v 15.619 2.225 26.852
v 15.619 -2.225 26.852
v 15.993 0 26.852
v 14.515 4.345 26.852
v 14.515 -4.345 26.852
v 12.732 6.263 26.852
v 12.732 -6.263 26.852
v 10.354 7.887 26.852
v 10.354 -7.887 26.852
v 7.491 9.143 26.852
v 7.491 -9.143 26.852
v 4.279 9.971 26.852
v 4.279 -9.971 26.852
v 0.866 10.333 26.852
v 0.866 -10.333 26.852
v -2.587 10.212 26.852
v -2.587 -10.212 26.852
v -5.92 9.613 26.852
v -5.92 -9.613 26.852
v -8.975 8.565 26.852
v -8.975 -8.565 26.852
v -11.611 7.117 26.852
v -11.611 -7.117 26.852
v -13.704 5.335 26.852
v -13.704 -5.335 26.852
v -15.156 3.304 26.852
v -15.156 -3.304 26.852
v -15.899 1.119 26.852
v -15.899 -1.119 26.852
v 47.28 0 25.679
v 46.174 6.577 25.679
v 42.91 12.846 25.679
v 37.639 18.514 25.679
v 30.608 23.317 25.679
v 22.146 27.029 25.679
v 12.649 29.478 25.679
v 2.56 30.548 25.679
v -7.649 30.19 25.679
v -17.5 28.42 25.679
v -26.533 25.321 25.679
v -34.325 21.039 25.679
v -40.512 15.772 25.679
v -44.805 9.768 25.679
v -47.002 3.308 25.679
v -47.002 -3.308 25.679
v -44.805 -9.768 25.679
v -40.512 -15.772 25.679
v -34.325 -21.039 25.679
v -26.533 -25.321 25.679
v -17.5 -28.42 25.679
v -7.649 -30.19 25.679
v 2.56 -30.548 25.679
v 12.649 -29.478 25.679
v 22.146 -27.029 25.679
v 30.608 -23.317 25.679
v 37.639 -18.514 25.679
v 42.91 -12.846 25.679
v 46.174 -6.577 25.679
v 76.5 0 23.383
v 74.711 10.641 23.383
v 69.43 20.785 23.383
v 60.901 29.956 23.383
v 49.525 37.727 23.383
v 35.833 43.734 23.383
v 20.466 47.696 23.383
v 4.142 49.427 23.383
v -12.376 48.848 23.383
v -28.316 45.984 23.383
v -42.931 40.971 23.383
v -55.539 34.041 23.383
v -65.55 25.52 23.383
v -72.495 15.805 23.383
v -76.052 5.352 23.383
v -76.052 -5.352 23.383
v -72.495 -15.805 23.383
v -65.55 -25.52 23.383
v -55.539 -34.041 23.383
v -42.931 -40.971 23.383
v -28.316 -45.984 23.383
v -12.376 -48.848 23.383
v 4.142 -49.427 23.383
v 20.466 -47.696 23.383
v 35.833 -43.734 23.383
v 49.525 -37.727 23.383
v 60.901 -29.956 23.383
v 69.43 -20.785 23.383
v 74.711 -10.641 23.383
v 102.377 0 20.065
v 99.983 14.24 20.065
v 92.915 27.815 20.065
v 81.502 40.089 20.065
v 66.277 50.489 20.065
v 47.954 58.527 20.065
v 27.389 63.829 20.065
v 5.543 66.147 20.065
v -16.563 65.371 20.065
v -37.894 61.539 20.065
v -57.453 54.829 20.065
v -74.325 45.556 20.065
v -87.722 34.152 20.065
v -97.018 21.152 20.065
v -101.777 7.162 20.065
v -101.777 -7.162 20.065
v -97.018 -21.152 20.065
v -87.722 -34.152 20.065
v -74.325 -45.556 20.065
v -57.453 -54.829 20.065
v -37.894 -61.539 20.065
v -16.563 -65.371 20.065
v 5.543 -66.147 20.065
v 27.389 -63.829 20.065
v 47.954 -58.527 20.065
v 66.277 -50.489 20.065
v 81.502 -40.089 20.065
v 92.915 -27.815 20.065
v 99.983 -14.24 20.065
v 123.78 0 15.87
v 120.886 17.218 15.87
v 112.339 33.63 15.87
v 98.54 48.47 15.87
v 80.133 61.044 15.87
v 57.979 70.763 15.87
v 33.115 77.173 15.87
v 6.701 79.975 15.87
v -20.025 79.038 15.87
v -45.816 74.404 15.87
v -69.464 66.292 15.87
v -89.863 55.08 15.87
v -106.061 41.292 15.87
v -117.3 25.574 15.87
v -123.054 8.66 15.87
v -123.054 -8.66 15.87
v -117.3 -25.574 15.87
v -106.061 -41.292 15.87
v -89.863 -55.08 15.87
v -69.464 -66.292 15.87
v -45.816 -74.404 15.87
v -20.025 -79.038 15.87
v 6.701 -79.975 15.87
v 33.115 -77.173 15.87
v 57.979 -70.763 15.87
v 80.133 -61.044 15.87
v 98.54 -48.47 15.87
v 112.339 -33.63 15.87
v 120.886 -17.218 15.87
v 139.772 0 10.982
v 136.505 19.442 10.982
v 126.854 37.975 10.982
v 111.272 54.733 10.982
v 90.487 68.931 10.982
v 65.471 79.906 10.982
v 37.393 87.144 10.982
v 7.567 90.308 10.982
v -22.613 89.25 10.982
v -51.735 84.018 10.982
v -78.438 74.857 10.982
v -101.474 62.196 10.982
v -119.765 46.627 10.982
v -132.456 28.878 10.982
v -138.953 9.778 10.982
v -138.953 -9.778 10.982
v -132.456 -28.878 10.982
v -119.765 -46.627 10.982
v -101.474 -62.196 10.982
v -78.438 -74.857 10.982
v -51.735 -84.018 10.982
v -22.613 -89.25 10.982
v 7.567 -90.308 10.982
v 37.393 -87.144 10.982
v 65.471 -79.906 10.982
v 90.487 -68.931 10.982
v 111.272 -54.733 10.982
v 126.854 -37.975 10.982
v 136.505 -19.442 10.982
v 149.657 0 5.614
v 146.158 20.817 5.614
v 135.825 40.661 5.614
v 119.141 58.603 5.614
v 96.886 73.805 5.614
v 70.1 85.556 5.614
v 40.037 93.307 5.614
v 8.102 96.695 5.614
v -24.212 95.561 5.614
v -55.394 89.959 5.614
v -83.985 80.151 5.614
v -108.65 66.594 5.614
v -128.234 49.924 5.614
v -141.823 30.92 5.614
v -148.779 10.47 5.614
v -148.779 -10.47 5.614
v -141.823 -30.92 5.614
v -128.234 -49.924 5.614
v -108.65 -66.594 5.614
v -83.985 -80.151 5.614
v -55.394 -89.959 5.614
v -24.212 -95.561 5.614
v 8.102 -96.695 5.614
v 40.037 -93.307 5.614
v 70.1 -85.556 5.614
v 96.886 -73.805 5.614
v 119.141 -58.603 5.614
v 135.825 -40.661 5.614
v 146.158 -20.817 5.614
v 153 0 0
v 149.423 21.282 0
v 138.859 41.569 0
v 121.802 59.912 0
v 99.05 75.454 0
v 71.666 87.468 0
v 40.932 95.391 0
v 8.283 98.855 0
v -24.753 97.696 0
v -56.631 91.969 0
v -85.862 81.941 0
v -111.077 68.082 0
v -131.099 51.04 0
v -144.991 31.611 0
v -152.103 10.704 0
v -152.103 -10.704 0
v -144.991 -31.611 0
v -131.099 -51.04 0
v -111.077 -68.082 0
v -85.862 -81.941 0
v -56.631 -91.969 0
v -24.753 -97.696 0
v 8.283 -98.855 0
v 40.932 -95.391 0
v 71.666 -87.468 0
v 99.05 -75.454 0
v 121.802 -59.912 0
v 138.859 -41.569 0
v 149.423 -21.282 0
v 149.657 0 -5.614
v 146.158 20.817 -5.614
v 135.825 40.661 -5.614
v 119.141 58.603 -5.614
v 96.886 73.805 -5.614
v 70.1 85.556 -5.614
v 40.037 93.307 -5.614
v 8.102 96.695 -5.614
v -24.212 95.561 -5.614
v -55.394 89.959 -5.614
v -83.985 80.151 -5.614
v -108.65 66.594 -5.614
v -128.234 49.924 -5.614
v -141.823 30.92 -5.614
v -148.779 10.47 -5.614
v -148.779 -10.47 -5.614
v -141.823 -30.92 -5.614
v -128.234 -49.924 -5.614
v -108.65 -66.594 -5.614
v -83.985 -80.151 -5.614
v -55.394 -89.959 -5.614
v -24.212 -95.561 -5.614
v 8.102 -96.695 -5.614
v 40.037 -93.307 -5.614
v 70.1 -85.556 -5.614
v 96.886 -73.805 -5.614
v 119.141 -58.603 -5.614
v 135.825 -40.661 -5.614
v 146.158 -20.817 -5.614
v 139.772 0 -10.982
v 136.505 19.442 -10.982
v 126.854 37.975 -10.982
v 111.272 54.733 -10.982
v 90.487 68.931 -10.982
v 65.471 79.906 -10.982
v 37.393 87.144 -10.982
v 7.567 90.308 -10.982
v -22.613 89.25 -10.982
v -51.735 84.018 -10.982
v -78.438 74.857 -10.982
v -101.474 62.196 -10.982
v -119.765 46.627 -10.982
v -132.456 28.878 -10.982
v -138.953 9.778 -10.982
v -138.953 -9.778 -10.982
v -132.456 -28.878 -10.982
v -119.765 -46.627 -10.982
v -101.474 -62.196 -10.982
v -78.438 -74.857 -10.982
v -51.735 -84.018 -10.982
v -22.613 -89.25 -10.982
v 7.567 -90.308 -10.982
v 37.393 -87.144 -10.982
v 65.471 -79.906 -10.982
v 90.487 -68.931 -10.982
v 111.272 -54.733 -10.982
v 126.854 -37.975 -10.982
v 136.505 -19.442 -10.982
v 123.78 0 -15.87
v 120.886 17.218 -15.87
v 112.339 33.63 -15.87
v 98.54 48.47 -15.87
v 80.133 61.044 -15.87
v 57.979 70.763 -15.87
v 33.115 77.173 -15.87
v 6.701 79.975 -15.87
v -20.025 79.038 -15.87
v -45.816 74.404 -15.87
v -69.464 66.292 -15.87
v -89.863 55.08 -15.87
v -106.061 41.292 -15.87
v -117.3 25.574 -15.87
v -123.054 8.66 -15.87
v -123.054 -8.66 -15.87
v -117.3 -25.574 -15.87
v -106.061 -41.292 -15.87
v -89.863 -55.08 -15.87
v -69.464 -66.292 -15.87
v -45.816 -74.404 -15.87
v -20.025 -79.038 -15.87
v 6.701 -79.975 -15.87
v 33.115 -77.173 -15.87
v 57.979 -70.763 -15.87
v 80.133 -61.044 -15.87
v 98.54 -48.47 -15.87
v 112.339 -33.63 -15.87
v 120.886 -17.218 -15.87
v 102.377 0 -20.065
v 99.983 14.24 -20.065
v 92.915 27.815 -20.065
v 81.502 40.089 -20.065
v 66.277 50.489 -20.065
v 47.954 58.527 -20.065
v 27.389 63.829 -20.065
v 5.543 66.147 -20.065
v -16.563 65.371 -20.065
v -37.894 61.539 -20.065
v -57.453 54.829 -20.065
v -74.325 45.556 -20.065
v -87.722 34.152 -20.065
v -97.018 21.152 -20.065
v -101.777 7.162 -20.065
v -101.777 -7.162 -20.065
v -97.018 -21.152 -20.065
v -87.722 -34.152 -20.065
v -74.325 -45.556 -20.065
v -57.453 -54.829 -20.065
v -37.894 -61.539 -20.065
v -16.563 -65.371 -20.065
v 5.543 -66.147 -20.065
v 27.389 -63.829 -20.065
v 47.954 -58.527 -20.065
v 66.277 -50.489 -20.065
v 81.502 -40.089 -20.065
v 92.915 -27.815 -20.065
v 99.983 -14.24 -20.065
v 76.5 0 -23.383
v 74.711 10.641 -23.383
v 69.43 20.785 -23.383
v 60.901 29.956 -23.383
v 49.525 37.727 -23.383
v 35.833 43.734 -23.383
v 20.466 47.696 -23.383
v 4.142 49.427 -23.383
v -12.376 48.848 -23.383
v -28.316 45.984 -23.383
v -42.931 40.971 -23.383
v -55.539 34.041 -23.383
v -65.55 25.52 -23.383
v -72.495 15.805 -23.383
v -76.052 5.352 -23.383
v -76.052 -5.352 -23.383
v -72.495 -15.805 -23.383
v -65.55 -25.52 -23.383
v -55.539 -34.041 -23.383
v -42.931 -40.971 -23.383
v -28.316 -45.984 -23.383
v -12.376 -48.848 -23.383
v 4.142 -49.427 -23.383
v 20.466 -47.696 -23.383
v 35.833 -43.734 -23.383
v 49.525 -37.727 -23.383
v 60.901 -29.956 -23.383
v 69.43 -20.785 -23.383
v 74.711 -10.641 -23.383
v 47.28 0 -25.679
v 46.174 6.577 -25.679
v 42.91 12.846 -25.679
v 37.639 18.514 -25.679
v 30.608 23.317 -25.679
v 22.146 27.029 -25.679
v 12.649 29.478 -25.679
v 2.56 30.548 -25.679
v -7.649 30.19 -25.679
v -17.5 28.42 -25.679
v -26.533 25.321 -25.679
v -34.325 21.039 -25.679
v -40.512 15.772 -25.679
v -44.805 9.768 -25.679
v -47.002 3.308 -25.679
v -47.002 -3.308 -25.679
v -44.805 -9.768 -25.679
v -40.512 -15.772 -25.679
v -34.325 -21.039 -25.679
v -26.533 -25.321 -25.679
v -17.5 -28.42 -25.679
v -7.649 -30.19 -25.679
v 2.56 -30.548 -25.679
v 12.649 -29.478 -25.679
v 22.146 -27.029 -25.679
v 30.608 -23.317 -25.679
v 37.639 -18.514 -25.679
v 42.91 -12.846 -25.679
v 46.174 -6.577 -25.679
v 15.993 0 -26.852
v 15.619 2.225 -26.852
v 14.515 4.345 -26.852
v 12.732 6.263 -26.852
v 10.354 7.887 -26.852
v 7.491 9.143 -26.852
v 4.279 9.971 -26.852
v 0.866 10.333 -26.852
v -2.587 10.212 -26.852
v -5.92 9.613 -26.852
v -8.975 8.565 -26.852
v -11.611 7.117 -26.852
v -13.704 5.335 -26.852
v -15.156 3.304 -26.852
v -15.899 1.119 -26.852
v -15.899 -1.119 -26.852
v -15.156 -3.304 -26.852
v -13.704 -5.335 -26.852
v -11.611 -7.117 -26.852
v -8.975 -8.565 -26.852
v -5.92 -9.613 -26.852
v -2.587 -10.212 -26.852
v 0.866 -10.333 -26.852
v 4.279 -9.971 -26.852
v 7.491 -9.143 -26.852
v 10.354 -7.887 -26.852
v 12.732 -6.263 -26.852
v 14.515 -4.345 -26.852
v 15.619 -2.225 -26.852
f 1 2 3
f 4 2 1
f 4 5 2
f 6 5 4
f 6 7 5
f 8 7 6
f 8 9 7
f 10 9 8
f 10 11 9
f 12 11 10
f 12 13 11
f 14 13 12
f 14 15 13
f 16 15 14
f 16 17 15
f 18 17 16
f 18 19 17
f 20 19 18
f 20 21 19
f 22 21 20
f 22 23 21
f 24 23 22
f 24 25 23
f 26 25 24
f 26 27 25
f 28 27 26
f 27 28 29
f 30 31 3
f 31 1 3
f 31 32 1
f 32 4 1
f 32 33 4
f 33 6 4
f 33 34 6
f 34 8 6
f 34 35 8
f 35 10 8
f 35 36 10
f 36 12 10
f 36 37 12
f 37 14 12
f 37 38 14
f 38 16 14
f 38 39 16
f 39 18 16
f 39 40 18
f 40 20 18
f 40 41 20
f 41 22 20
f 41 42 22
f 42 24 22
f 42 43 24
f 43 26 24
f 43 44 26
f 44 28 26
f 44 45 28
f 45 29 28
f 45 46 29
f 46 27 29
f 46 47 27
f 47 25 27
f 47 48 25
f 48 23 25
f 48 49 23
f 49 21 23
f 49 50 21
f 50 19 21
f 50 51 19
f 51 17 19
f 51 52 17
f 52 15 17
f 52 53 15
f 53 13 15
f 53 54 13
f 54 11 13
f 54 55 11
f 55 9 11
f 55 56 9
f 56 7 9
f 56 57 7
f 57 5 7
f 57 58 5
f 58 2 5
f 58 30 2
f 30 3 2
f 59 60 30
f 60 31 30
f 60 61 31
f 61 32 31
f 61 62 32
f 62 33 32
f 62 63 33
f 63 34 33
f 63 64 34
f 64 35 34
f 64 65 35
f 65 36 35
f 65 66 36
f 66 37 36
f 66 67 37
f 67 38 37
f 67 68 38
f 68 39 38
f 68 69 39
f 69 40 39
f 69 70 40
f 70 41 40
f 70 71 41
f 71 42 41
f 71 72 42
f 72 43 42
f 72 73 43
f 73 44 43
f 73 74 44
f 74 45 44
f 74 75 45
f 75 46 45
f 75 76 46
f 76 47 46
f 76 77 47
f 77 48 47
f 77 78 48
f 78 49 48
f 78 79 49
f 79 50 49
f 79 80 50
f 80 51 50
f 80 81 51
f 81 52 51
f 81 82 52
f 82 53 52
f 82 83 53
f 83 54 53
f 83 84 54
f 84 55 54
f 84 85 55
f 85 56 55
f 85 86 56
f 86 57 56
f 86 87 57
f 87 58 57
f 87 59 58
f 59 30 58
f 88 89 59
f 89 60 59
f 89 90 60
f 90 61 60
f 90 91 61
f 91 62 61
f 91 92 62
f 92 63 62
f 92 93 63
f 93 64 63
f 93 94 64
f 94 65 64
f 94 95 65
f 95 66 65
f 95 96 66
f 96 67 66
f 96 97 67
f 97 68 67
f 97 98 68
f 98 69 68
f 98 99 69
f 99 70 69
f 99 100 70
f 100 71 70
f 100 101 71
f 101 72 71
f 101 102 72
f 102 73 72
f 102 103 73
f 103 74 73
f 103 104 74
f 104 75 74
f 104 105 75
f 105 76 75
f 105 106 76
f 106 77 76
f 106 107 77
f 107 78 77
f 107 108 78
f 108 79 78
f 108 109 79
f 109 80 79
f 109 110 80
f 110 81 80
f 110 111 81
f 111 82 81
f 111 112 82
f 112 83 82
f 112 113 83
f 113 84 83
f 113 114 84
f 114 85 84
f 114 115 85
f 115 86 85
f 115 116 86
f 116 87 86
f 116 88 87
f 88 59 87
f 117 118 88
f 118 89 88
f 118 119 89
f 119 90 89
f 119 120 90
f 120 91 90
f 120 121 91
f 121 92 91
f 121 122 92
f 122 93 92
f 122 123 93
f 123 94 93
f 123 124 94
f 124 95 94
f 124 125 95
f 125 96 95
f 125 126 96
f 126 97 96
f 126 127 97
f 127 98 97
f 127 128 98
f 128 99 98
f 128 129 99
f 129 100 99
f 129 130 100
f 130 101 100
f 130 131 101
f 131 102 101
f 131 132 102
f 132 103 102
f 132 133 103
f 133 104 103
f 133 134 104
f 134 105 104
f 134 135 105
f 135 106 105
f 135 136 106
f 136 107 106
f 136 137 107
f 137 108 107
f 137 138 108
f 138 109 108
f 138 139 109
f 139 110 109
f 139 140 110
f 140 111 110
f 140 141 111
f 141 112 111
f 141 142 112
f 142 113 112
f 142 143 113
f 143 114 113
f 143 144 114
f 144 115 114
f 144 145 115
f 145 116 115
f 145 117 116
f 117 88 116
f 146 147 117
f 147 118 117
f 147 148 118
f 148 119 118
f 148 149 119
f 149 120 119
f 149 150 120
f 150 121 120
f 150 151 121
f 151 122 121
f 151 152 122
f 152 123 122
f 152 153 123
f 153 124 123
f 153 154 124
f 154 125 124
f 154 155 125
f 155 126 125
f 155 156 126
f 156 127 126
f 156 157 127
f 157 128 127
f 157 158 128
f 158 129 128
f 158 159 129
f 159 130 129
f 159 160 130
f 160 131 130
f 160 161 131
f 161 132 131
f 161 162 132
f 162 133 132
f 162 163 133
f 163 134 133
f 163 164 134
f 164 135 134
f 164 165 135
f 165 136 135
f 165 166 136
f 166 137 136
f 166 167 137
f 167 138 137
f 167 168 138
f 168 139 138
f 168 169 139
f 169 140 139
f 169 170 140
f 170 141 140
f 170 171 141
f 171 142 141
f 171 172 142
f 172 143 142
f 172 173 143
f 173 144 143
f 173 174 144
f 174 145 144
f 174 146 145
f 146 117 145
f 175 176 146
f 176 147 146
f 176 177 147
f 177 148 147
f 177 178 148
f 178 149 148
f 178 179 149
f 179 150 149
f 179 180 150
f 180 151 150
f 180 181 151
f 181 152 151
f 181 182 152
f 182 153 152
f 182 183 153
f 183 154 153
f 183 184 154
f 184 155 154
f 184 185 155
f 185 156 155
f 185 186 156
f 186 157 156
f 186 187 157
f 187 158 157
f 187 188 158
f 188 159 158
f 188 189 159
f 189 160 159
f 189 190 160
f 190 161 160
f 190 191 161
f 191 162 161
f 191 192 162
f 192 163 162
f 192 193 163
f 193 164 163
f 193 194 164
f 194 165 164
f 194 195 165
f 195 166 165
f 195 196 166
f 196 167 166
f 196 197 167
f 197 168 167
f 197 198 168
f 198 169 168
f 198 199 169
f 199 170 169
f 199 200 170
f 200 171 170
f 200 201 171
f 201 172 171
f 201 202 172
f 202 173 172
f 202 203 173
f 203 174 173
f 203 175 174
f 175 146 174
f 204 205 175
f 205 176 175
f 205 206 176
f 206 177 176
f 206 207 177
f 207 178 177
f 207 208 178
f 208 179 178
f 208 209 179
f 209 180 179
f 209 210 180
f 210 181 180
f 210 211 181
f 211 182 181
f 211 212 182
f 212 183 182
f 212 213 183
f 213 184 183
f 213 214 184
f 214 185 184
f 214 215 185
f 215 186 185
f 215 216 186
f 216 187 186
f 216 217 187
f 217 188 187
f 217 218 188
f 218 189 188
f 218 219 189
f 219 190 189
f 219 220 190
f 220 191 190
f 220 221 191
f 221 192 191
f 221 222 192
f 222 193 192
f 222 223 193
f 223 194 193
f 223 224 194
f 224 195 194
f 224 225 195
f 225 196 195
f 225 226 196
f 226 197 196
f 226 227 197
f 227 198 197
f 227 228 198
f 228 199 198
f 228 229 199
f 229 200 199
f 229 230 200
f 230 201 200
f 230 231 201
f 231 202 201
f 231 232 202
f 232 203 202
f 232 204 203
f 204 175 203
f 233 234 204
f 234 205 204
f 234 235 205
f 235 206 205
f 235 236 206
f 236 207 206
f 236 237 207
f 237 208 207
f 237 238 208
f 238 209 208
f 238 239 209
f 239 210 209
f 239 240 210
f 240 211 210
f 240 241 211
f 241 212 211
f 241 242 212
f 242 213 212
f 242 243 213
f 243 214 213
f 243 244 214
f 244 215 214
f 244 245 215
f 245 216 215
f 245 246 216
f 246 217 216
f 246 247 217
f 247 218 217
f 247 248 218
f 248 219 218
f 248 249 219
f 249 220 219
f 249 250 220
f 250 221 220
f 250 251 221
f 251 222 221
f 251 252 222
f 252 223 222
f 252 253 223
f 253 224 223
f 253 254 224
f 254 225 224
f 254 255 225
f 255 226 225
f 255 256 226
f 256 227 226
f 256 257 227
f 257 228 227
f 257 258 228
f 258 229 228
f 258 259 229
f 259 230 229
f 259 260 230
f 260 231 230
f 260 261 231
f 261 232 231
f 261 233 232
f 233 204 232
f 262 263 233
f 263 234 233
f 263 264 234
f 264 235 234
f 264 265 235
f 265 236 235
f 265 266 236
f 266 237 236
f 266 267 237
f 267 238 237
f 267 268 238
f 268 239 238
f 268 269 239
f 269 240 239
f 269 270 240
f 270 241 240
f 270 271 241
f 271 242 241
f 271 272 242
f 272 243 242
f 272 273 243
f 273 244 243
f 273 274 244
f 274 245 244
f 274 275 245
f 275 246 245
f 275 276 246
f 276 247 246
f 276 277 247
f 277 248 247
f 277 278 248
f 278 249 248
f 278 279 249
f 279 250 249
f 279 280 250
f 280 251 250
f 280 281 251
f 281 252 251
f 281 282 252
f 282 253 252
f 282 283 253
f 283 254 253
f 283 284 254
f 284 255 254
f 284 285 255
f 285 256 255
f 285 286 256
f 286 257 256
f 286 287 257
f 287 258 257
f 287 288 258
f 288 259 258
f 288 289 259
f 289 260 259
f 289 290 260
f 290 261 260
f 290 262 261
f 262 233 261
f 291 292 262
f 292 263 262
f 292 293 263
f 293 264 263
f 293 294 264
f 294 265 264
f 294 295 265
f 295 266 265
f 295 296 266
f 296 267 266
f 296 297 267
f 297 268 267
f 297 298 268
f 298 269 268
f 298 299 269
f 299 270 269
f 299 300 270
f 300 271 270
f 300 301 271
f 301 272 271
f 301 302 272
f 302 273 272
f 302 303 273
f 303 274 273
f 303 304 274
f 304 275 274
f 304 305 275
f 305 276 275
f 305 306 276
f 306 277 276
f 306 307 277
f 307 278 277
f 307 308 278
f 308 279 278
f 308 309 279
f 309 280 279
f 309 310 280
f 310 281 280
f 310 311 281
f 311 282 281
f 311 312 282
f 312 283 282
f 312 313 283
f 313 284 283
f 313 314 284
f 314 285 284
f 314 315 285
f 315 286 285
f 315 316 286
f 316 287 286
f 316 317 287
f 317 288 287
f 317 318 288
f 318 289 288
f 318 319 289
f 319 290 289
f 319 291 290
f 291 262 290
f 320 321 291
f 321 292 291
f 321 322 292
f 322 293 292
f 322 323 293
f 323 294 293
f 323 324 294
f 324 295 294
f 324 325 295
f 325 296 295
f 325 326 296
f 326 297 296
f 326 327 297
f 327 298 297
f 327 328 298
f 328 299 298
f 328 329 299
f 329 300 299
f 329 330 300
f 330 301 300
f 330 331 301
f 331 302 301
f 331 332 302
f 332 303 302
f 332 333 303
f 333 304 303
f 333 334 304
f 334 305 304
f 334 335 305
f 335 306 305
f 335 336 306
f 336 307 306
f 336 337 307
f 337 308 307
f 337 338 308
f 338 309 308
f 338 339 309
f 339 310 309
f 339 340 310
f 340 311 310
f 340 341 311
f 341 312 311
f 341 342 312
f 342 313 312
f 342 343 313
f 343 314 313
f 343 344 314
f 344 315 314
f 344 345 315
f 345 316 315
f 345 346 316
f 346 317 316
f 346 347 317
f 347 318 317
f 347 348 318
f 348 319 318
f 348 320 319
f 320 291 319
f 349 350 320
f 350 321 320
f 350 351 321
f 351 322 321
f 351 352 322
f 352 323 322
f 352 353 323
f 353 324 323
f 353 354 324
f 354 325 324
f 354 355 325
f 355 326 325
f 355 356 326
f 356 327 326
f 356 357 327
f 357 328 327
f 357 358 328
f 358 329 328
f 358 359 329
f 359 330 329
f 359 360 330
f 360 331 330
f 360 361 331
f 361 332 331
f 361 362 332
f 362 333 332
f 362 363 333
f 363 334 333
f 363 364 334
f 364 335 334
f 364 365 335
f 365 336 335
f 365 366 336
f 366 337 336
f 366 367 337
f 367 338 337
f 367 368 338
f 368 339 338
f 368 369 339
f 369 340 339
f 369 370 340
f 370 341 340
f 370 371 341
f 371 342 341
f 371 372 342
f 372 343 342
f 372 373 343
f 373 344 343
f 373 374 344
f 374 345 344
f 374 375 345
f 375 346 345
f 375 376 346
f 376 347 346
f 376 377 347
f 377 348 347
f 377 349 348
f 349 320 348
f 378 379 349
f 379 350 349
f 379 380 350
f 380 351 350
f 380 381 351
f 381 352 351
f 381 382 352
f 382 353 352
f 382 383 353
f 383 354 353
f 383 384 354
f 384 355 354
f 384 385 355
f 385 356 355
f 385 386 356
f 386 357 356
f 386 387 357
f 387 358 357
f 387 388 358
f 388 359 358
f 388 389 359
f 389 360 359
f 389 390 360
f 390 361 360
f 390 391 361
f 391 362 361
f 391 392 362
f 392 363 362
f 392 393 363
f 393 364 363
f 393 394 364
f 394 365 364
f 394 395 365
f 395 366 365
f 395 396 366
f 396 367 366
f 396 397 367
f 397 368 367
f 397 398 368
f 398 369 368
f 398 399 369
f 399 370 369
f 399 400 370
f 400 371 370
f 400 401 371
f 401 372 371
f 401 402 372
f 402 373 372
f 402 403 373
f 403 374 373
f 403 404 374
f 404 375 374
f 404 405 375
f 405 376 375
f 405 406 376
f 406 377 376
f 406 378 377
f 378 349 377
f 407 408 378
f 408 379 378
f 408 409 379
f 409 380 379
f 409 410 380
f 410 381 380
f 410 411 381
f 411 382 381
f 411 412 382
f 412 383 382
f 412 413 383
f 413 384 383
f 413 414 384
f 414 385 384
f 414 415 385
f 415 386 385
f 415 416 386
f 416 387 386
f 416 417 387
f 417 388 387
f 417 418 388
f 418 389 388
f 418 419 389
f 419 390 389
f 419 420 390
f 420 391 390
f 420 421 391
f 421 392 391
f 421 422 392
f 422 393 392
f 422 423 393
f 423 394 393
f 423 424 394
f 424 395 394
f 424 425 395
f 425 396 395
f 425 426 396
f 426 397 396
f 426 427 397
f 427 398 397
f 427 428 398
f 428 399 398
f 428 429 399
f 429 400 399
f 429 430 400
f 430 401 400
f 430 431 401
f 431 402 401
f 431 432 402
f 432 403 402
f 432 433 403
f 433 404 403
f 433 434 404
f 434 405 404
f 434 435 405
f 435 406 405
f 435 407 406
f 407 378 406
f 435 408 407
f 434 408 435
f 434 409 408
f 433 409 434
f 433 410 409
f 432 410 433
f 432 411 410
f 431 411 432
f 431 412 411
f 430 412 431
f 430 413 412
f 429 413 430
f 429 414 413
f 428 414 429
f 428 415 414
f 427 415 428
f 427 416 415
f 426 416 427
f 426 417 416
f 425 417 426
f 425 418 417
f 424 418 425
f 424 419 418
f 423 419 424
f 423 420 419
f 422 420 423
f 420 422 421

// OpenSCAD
// Generated by SolidPython 1.0.1 on 2020-07-29 00:46:53


scale(v = [17, 11, 3]) {
	sphere(r = 9);
}
/***********************************************
*********      SolidPython code:      **********
************************************************
 
# import packages: SolidPython
from solid import *
from solid.utils import *
from itertools import chain, combinations, permutations


class Resize:

    def __init__(self, scad_file):
        self.scad_file = scad_file
        #self.scad_file = import_scad(scad_file)
        # cone/cylinder param:
        self.r1 = 0
        self.r2 = 0
        self.h = 0
        # rectangular prism param:
        self.w = 0
        self.l = 0
        # ellipse param:
        self.r = 0

    # import OpenScad code (file name corresponds to shape)


    # classify shape + parameters
    def assign(self, param1, param2, param3):
        if self.scad_file == 'cone.scad':
            self.r1 = param1
            self.r2 = param2
            self.h = param3
        elif self.scad_file == 'cylinder.scad':
            self.r1 = param1
            self.r2 = param2
            self.h = param3
        elif self.scad_file == 'rectangularPrism.scad':
            self.h = param1
            self.l = param2
            self.w = param3
        else:
            self.r = param1
            self.h = param2

    # resize parameters
    def iterate(self):
        x = range(3, 20, 2)
        i = 1
        if self.scad_file == 'cone.scad':
            tempList = list(permutations(x, 2))
            for temp in tempList:
                param1 = temp[0]
                param2 = temp[1]
                filepath = 'produced_scad_files/' + 'cone' + str(param1) + '_' + str(param2) + '_' + '.scad'
                scad_render_to_file(cylinder(h=param1, r1=param2, r2=0), filepath)

        elif self.scad_file == 'cylinder.scad':
            tempList = list(permutations(x, 3))
            for temp in tempList:
                param1 = temp[0]
                param2 = temp[1]
                filepath = 'produced_scad_files/' + 'cylinder' + str(param1) + '_' + str(param2) + '_' + '.scad'
                scad_render_to_file(cylinder(h=param1, r1=param2, r2=param2), filepath)

        elif self.scad_file == 'rectangularPrism.scad':
            tempList = list(permutations(x, 3))
            for temp in tempList:
                param1 = temp[0]
                param2 = temp[1]
                param3 = temp[2]
                filepath = 'produced_scad_files/' + 'rectangularPrism' + str(param1) + '_' + str(param2) + '_' + str(
                    param3) + '.scad'
                scad_render_to_file(cube(size=(param1, param2, param3)), filepath)

        elif self.scad_file == 'ellipse.scad':
            tempList = list(permutations(x, 4))
            for temp in tempList:
                param1 = temp[0]
                param2 = temp[1]
                param3 = temp[2]
                param4 = temp[3]
                filepath = 'produced_scad_files/' + 'ellipse' + str(param1) + '_' + str(param2) + '_' + str(param3) + '_' + str(param4) + '.scad'
                scad_render_to_file(scale([param1, param2, param3])(sphere(r=param4)), filepath)

    def render_to_scadfile(self):
        scad_render_to_file(scad, 'example.scad') 
 
************************************************/
